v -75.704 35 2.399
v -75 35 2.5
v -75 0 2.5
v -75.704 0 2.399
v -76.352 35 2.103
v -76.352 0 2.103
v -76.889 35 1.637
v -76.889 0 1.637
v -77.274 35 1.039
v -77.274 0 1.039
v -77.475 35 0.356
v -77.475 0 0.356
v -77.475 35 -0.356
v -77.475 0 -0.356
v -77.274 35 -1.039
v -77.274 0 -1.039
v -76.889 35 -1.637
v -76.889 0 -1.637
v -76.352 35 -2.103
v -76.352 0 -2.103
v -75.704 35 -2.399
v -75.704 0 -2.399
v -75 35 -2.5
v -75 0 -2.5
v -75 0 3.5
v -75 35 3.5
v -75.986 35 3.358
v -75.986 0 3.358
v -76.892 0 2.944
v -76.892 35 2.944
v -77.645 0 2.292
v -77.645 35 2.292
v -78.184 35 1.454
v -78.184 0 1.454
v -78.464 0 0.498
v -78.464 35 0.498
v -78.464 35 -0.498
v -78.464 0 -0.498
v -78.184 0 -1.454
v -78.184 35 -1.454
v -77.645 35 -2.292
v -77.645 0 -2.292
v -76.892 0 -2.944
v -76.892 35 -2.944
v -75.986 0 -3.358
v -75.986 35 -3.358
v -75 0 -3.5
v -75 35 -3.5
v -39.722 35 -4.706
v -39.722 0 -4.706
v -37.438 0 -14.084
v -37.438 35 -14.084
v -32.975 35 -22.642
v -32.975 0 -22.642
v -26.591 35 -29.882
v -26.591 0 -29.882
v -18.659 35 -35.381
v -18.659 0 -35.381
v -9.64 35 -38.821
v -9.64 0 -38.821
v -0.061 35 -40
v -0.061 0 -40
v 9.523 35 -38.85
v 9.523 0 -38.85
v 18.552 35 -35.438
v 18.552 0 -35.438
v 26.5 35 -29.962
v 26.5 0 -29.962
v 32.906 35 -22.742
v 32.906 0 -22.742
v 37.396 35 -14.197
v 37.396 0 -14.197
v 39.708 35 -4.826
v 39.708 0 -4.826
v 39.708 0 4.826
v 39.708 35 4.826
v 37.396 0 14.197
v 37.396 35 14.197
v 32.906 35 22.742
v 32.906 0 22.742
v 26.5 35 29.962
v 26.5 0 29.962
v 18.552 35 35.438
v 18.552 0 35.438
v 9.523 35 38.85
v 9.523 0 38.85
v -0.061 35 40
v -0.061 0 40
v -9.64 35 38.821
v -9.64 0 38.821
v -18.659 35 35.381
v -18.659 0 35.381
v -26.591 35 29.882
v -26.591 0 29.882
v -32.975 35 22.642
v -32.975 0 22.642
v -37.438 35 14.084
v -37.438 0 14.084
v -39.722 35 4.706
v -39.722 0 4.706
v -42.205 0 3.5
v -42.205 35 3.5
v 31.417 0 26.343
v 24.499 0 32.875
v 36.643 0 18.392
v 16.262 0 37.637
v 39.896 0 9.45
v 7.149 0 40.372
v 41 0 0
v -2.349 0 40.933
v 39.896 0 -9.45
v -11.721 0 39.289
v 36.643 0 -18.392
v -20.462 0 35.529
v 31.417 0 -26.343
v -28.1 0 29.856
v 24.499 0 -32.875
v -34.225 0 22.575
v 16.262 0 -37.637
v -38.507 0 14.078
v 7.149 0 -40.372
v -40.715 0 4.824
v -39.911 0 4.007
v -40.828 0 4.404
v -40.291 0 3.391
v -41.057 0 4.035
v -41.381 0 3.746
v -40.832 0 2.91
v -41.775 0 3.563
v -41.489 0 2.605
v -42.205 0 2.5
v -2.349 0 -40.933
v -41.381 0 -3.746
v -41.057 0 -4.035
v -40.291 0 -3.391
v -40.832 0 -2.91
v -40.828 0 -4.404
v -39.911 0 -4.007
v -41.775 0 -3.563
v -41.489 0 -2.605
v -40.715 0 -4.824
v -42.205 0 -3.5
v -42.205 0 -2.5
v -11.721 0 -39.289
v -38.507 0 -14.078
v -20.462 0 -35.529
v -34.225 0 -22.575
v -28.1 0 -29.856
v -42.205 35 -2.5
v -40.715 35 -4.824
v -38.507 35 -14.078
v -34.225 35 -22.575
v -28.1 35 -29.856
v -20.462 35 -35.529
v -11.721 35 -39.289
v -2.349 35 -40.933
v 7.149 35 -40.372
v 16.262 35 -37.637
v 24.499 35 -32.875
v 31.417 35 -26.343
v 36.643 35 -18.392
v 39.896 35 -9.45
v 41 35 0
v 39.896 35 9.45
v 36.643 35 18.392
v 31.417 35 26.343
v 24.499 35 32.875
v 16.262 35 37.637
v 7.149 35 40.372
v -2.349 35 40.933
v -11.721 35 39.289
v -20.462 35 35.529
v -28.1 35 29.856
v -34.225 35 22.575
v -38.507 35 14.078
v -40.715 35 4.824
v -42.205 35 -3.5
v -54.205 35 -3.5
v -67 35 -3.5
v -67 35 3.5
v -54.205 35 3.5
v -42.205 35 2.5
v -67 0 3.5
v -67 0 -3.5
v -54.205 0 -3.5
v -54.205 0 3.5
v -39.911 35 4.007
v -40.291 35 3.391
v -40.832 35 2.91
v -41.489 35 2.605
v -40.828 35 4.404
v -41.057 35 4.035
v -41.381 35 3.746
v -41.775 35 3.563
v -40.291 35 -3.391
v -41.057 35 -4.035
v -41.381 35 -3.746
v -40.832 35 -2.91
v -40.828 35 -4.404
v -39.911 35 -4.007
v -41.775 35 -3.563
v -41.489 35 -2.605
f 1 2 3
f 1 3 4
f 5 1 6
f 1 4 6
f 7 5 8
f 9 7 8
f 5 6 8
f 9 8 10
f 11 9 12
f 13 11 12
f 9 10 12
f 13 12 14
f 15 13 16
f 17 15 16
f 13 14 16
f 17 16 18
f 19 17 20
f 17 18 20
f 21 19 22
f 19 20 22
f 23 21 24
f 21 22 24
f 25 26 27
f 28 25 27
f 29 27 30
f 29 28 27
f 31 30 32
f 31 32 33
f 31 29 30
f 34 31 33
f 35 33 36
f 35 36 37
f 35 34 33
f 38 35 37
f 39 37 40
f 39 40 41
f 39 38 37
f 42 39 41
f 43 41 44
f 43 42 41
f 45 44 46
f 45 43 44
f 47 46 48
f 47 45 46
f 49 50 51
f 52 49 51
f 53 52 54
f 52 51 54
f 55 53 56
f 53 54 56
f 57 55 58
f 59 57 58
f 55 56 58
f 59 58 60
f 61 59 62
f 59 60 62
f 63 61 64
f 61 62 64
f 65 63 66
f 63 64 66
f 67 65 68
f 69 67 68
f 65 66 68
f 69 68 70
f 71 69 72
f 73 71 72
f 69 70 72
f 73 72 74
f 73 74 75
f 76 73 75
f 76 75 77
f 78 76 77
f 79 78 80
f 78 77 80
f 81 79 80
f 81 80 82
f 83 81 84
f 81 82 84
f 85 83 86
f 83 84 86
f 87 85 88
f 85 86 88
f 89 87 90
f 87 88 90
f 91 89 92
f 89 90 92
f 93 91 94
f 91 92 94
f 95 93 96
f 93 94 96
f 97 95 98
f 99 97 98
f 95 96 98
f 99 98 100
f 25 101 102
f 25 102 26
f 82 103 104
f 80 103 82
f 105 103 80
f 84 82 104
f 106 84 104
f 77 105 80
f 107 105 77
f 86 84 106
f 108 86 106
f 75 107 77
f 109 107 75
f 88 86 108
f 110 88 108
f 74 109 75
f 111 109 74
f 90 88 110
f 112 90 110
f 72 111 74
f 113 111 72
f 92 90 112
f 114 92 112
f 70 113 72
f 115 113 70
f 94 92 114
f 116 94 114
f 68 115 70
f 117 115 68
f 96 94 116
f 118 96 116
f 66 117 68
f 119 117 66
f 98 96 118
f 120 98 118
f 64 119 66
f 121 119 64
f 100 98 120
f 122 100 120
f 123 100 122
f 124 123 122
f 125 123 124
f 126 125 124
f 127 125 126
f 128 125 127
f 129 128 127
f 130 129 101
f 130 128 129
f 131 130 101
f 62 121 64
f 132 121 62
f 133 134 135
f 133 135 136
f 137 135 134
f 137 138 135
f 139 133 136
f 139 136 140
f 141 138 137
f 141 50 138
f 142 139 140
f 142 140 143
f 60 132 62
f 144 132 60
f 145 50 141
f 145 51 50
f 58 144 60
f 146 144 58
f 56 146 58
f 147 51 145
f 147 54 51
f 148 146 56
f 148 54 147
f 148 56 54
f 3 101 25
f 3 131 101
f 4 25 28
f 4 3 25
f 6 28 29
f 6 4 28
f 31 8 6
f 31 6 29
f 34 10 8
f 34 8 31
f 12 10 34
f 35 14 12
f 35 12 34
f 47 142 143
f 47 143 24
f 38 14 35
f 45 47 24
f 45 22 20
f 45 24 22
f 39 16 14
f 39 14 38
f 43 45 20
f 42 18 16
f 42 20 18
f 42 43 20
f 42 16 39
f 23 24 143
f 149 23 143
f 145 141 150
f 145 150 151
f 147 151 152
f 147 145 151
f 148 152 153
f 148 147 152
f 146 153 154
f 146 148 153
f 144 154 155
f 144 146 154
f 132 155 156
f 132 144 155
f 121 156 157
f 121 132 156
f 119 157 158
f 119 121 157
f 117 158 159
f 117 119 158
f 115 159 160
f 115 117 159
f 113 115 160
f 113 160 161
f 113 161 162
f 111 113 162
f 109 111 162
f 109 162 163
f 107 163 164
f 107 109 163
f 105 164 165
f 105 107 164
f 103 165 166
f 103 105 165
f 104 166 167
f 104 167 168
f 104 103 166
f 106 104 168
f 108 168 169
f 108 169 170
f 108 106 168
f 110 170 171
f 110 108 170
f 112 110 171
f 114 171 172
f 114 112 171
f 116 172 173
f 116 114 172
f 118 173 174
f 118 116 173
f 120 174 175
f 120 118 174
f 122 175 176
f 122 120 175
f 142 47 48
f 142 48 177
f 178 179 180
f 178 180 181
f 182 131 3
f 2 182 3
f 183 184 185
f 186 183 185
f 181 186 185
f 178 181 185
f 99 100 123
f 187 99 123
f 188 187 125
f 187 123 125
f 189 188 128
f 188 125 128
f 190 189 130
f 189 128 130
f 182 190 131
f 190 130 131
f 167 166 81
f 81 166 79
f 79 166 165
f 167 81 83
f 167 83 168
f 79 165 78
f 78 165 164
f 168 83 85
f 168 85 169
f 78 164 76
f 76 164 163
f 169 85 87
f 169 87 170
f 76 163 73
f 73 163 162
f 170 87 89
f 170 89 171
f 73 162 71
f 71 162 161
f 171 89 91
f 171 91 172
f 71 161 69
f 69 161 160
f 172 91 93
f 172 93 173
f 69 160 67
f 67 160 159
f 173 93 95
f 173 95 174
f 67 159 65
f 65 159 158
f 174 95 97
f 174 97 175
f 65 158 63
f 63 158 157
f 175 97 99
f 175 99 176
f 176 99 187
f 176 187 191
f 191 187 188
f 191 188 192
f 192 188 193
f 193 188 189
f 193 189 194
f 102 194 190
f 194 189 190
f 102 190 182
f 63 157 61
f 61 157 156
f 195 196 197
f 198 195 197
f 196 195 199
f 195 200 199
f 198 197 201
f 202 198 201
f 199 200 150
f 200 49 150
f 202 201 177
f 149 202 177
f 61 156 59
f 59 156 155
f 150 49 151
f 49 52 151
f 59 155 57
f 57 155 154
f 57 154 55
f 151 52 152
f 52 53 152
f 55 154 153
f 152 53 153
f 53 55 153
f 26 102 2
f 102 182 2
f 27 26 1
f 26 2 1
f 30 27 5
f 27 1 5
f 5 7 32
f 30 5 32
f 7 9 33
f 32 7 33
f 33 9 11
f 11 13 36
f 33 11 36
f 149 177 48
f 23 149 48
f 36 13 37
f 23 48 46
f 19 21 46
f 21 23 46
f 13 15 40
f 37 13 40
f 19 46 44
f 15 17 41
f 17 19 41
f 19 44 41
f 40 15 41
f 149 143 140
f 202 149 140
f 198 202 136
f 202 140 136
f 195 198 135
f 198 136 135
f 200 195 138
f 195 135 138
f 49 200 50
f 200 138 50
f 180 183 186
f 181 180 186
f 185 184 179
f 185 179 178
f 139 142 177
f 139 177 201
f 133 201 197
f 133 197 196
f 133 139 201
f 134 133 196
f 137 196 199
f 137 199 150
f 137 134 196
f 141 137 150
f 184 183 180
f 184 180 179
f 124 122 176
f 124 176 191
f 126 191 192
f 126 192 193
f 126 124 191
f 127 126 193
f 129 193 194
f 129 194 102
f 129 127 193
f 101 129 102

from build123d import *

# Parameters (mm, degrees)
BOSS_EXTRUDE1_DEPTH = 35
SKETCH2_W           = 12.79514246
SKETCH2_H           = 7
BOSS_EXTRUDE2_DEPTH = 35


with BuildPart() as part:
    # Sketch1 → Boss-Extrude1 (new body)
    with BuildSketch(Plane(origin=(0, 0, 0), x_dir=(1, 0, 0), z_dir=(0, 1, 0))):
        with BuildLine():
            Line((-75, 3.5), (-42.20485754, 3.5))
            ThreePointArc((-42.20485754, 3.5), (-41.208540794, 3.878682498), (-40.715274333, 4.823529412))
            ThreePointArc((-40.715274333, 4.823529412), (41, 0), (-40.715274333, -4.823529412))
            ThreePointArc((-40.715274333, -4.823529412), (-41.208540794, -3.878682498), (-42.20485754, -3.5))
            Line((-42.20485754, -3.5), (-75, -3.5))
            ThreePointArc((-75, -3.5), (-78.5, 0), (-75, 3.5))
        make_face()
        with BuildLine():
            Line((-75, 2.5), (-42.20485754, 2.5))
            ThreePointArc((-42.20485754, 2.5), (-40.54432963, 3.131137496), (-39.722218861, 4.705882353))
            ThreePointArc((-39.722218861, 4.705882353), (40, 0), (-39.722218861, -4.705882353))
            ThreePointArc((-39.722218861, -4.705882353), (-40.54432963, -3.131137496), (-42.20485754, -2.5))
            Line((-42.20485754, -2.5), (-75, -2.5))
            ThreePointArc((-75, -2.5), (-77.5, 0), (-75, 2.5))
        make_face(mode=Mode.SUBTRACT)
    extrude(amount=BOSS_EXTRUDE1_DEPTH)


with BuildPart() as body_2:
    # Sketch2 → Boss-Extrude2 (new body)
    with BuildSketch(Plane(origin=(0, 35, 0), x_dir=(1, 0, 0), z_dir=(0, 1, 0))):
        with Locations((-60.60242877, 0)):
            Rectangle(SKETCH2_W, SKETCH2_H)
    extrude(amount=-BOSS_EXTRUDE2_DEPTH)


solid = Compound([part.part, body_2.part])
